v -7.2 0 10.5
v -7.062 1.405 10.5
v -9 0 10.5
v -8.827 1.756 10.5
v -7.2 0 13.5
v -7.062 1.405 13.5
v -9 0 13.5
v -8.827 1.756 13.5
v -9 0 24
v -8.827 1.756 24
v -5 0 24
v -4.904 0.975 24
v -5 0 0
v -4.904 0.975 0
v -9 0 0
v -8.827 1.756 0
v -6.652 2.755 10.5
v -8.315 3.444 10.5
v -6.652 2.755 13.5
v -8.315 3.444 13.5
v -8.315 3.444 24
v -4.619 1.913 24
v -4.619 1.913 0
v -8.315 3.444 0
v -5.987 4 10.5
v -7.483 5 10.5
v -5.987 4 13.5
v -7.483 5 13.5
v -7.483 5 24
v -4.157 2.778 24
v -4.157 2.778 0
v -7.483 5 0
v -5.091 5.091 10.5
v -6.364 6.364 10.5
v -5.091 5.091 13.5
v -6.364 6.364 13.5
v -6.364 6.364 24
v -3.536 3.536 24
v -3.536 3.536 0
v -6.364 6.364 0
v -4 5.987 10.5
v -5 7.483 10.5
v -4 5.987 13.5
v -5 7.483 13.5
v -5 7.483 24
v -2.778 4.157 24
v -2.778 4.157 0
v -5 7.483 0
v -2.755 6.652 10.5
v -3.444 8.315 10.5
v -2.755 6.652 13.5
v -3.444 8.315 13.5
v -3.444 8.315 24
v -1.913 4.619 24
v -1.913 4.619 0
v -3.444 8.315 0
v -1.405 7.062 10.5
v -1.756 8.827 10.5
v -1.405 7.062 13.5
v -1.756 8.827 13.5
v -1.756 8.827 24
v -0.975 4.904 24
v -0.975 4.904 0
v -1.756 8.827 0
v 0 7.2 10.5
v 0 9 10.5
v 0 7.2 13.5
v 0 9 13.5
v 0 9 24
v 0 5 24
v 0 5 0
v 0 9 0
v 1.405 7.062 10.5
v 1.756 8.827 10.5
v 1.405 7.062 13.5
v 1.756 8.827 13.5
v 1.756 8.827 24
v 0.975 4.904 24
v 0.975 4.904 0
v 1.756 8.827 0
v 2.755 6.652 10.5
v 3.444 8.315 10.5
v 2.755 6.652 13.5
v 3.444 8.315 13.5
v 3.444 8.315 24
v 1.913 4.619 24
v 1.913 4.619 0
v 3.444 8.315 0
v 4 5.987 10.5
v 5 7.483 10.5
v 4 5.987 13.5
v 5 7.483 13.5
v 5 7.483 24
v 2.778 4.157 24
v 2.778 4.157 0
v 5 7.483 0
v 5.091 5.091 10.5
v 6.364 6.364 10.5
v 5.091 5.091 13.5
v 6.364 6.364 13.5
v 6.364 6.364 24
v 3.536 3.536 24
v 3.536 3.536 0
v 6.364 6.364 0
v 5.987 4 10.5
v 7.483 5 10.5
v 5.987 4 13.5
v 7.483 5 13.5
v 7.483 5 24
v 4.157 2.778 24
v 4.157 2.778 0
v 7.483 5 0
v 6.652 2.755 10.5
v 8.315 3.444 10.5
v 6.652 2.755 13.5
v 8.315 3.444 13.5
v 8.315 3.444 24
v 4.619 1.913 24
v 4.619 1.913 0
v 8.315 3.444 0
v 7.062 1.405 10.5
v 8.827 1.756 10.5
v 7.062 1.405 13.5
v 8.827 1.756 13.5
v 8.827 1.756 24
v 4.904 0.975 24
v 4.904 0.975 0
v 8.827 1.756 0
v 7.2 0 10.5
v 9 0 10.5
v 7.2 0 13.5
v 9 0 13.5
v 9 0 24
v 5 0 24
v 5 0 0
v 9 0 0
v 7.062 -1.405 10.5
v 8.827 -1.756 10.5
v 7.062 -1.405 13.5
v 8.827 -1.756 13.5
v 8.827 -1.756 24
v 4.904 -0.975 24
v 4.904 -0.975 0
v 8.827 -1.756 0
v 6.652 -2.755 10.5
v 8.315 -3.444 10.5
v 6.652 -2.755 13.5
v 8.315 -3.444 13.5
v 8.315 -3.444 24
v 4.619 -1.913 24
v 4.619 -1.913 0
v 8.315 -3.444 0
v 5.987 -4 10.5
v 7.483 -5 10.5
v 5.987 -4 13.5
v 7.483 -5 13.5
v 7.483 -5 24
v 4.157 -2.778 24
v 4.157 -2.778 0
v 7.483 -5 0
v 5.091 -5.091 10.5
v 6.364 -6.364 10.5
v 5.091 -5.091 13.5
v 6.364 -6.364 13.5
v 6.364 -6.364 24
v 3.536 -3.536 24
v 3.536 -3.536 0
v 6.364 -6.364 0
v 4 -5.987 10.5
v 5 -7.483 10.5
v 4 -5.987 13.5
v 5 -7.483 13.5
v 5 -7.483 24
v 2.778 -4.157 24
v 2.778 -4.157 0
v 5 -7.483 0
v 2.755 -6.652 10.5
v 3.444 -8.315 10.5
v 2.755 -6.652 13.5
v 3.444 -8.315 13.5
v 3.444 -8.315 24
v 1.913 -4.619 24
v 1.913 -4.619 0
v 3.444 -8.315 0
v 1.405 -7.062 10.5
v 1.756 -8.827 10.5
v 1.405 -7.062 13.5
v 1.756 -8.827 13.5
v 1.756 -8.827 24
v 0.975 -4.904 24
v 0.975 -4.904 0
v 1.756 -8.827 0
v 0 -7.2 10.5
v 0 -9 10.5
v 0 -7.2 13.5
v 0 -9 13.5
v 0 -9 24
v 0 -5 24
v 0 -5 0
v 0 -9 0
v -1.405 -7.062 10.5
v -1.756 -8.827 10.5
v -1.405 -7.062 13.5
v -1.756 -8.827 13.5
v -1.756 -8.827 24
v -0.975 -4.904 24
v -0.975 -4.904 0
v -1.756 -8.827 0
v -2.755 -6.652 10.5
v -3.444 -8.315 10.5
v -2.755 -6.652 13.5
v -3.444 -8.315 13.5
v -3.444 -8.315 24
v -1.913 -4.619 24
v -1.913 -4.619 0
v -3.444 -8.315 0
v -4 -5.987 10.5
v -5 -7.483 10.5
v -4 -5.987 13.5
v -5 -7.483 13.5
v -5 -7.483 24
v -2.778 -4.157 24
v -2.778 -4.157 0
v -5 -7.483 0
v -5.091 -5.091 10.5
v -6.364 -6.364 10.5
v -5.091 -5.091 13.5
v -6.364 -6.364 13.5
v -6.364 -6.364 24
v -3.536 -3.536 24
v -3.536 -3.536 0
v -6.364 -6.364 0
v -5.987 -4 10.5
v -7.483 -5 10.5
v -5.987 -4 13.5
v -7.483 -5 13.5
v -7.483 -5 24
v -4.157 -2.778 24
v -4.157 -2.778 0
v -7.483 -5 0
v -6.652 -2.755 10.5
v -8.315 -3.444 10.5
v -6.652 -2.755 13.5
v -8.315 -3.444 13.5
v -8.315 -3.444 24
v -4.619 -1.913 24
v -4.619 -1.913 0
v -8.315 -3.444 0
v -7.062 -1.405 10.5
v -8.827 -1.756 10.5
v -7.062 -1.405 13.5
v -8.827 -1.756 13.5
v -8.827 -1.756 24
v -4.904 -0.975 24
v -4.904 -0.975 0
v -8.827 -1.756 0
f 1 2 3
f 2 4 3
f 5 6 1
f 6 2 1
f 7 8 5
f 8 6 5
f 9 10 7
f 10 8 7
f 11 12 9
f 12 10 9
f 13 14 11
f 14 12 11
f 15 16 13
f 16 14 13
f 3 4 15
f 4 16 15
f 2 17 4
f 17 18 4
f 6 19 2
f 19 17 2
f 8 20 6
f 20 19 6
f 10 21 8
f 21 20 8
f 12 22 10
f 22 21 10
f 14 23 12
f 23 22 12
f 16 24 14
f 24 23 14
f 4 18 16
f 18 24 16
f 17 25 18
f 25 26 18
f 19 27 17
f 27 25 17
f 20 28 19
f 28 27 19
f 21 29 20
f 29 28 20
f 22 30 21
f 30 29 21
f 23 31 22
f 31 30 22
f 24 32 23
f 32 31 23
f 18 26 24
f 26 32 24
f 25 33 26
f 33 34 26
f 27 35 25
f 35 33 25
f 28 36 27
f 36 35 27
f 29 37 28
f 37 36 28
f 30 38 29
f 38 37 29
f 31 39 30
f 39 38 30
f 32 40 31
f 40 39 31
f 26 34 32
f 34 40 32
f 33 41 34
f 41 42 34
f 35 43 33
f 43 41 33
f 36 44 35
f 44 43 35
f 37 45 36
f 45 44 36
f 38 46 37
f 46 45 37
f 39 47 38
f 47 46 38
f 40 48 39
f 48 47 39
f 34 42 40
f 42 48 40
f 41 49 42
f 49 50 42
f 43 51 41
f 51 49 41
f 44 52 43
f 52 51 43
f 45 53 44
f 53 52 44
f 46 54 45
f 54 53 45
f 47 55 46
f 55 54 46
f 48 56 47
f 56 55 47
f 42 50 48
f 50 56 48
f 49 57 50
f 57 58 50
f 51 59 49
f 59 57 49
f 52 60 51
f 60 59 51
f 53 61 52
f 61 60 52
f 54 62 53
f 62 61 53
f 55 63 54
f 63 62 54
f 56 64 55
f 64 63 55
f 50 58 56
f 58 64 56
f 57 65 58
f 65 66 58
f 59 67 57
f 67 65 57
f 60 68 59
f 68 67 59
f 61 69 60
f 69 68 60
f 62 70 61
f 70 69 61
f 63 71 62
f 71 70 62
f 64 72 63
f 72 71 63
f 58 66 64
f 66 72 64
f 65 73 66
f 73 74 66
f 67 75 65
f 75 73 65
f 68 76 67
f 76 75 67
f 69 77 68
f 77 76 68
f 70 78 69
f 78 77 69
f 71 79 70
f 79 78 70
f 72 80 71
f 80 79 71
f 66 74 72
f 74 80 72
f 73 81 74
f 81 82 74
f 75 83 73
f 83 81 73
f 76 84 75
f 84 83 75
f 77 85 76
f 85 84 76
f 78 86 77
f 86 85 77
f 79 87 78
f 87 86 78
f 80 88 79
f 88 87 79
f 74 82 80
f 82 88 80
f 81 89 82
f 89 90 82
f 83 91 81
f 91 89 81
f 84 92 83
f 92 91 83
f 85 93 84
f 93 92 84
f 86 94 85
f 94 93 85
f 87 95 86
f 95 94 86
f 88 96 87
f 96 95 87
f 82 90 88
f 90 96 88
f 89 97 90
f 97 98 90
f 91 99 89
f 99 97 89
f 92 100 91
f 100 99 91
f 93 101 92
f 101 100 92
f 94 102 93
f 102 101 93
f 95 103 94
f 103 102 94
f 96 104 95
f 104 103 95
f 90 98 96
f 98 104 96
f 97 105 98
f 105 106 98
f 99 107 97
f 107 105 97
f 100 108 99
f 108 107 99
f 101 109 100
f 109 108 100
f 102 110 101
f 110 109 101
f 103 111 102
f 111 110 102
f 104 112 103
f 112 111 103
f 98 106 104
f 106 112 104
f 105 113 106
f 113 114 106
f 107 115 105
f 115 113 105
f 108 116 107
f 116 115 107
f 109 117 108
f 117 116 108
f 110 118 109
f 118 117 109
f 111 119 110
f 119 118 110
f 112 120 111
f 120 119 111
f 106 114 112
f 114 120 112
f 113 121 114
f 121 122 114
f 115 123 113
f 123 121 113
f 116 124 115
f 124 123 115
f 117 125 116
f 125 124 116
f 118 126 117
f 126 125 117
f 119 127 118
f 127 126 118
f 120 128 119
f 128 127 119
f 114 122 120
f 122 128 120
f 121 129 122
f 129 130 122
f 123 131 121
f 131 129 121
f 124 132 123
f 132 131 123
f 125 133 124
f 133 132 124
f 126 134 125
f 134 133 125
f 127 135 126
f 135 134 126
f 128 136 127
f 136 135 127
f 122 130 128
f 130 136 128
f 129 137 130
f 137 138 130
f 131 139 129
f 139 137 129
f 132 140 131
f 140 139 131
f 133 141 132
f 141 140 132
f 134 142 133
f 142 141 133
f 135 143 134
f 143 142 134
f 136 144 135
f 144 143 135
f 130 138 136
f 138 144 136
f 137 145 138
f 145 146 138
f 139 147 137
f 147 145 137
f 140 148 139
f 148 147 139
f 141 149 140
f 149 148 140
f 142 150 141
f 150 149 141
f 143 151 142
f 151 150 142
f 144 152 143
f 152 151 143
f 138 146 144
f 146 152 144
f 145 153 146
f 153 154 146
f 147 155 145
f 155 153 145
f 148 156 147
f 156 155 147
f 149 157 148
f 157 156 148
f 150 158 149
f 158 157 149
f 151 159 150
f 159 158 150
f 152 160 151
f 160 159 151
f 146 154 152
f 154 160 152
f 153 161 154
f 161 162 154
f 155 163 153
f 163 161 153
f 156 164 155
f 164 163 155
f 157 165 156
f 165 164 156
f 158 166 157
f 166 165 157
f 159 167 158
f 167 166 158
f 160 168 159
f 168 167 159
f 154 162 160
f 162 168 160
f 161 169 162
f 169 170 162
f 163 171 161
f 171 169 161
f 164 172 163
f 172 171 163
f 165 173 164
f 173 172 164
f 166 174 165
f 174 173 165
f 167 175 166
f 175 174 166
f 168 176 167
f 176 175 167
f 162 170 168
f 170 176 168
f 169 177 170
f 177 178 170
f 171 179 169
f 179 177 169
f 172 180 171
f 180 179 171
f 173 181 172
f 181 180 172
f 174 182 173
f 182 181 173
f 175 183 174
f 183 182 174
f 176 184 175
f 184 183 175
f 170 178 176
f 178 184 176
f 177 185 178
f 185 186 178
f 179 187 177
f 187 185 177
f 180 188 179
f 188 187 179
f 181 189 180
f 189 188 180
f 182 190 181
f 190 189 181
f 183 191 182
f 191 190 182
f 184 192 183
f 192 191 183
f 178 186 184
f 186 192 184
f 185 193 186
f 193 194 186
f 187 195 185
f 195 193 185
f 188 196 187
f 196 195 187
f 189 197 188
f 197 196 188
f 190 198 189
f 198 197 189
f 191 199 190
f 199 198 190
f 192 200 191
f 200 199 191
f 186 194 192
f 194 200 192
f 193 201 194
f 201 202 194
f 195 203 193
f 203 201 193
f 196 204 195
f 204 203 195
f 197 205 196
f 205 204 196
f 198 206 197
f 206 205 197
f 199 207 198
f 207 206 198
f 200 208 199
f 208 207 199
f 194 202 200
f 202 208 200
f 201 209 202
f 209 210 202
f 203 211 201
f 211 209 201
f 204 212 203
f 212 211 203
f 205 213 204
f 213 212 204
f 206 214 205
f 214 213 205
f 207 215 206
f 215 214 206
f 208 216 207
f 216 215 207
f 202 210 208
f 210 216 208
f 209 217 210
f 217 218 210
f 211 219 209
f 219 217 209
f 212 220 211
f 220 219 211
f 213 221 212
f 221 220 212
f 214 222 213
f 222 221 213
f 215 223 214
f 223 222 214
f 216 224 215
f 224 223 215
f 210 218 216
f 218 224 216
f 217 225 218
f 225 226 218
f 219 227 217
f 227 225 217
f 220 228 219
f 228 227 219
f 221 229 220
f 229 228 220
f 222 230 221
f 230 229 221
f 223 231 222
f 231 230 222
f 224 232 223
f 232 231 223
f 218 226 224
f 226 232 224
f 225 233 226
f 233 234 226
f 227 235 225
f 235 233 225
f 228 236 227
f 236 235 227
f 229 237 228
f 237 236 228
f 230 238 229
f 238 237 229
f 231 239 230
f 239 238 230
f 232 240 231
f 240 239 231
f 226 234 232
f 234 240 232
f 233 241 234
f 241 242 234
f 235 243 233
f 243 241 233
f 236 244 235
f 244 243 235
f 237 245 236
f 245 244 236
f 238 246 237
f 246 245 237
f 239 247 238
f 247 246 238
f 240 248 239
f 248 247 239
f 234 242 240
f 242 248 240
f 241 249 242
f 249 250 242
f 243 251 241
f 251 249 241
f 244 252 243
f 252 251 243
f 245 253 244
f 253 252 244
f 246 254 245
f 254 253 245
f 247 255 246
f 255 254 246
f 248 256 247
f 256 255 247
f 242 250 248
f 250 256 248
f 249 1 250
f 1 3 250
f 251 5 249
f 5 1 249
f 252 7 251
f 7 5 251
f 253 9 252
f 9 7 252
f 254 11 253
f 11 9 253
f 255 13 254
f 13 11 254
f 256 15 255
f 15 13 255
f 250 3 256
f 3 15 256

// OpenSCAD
$fn = 32;

// ----------------------------------------------------------------------
// Grooved revolve: stepped, bore R5
// ----------------------------------------------------------------------

// --- parameters (mm) ---
bore_r = 5;               // bore radius
outer_r = 9;              // outer radius of the body
total_h = 24;             // overall height, Z
wall = 4;                 // radial wall thickness
groove_w = 3;             // groove width
groove_d = 1.8;           // groove depth
grooves = 1;              // number of outer grooves

bbox_x = 2 * outer_r;  // full diameter
bore_d = 2 * bore_r;  // bore diameter
body_d = 2 * outer_r;  // body diameter
revolve_angle = 360;  // full turn around the Z axis

profile = [[5, 0], [9, 0], [9, 10.5], [7.2, 10.5], [7.2, 13.5], [9, 13.5], [9, 24], [5, 24]];  // primary outline, 8 points, counter clockwise

// --- the one profile operation ---
rotate_extrude(angle = revolve_angle) polygon(points = profile);
